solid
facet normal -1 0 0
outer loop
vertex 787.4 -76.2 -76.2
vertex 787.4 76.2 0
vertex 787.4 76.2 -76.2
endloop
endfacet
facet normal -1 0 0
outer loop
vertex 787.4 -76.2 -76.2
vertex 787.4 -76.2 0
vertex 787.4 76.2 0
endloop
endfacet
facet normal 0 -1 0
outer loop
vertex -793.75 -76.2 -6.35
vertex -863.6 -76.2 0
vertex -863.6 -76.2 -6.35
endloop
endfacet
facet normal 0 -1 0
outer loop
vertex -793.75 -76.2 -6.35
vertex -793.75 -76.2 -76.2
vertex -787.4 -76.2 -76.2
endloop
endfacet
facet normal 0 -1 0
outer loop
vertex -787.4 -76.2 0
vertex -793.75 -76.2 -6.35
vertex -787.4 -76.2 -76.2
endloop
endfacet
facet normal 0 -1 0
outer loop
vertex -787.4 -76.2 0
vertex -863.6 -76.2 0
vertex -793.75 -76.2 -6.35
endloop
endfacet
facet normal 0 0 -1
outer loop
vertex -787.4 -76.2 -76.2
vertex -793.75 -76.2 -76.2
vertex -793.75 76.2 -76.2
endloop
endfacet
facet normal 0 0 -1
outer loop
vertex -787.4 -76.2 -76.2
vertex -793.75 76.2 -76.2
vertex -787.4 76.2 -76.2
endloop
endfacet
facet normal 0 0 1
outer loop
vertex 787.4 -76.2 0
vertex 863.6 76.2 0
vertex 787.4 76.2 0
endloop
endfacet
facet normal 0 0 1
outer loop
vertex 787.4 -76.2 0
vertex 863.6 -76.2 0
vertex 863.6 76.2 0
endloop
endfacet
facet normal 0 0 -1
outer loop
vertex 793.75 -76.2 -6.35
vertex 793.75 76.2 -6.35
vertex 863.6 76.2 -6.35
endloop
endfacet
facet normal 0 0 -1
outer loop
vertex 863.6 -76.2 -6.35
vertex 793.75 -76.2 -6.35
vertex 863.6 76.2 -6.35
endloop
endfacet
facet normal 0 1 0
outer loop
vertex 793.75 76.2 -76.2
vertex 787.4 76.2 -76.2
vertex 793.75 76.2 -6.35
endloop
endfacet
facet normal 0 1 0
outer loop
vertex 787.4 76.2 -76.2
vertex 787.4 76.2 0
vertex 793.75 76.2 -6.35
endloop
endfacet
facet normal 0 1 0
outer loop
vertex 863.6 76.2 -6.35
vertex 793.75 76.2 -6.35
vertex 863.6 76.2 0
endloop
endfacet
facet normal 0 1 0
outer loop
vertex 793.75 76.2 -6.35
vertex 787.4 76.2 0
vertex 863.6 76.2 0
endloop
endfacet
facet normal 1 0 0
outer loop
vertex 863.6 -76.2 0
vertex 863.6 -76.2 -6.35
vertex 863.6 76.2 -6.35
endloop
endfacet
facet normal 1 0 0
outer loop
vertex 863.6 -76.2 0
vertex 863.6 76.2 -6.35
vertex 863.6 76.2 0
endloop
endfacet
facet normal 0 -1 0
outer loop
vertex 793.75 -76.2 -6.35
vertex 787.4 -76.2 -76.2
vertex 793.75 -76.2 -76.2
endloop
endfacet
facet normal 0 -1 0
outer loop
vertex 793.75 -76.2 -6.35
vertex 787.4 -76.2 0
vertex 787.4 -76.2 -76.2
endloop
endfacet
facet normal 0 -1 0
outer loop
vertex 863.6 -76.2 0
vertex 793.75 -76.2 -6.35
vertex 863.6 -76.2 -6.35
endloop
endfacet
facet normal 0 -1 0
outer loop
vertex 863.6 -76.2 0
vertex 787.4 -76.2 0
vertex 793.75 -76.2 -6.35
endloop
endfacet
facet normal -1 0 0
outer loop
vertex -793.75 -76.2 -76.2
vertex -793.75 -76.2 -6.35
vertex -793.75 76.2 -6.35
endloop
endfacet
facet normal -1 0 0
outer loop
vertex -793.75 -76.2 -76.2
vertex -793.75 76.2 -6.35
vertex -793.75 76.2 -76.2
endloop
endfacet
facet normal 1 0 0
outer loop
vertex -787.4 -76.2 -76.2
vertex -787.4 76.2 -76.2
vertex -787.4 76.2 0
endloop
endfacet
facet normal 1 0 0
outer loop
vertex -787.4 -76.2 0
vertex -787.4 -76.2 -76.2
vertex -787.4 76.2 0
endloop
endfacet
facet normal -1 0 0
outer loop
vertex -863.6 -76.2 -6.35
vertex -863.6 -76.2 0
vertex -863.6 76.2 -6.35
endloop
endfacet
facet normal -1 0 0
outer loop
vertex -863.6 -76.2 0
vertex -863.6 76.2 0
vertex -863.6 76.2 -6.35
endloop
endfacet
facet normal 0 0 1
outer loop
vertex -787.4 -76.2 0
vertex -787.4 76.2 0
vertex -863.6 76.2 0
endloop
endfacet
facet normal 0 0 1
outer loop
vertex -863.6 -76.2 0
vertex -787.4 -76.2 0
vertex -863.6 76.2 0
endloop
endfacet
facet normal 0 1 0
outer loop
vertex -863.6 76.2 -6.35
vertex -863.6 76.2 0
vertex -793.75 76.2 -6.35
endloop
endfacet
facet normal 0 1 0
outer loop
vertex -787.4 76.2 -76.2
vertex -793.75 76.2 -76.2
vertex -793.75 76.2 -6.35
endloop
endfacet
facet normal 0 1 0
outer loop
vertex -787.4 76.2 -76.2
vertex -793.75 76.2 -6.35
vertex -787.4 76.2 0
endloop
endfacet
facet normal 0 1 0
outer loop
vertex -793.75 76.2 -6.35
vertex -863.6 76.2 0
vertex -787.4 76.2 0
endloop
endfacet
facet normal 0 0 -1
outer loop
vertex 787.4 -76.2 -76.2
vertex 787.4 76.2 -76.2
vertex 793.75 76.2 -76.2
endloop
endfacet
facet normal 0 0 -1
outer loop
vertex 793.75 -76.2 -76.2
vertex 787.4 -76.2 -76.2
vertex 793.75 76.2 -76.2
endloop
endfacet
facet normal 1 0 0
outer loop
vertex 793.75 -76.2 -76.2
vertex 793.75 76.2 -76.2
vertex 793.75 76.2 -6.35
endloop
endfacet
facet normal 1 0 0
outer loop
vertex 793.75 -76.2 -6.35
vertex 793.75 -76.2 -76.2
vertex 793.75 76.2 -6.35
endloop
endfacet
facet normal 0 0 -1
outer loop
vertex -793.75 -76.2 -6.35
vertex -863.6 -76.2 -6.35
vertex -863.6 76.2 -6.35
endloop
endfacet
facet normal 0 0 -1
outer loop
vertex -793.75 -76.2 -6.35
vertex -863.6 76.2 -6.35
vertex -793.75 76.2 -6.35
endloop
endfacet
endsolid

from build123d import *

# Parameters (mm, degrees)
F1_DEPTH = 76.2


with BuildPart() as f1:
    # F0 (on Front) → F1 (new body, symmetric)
    with BuildSketch(Plane.XZ):
        Polygon((-787.4, 0), (-863.6, 0), (-863.6, -6.35), (-793.75, -6.35), (-793.75, -76.2), (-787.4, -76.2), align=None)
        Polygon((787.4, -76.2), (793.75, -76.2), (793.75, -6.35), (863.6, -6.35), (863.6, 0), (787.4, 0), align=None)
    extrude(amount=F1_DEPTH, both=True)


solid = f1.part
